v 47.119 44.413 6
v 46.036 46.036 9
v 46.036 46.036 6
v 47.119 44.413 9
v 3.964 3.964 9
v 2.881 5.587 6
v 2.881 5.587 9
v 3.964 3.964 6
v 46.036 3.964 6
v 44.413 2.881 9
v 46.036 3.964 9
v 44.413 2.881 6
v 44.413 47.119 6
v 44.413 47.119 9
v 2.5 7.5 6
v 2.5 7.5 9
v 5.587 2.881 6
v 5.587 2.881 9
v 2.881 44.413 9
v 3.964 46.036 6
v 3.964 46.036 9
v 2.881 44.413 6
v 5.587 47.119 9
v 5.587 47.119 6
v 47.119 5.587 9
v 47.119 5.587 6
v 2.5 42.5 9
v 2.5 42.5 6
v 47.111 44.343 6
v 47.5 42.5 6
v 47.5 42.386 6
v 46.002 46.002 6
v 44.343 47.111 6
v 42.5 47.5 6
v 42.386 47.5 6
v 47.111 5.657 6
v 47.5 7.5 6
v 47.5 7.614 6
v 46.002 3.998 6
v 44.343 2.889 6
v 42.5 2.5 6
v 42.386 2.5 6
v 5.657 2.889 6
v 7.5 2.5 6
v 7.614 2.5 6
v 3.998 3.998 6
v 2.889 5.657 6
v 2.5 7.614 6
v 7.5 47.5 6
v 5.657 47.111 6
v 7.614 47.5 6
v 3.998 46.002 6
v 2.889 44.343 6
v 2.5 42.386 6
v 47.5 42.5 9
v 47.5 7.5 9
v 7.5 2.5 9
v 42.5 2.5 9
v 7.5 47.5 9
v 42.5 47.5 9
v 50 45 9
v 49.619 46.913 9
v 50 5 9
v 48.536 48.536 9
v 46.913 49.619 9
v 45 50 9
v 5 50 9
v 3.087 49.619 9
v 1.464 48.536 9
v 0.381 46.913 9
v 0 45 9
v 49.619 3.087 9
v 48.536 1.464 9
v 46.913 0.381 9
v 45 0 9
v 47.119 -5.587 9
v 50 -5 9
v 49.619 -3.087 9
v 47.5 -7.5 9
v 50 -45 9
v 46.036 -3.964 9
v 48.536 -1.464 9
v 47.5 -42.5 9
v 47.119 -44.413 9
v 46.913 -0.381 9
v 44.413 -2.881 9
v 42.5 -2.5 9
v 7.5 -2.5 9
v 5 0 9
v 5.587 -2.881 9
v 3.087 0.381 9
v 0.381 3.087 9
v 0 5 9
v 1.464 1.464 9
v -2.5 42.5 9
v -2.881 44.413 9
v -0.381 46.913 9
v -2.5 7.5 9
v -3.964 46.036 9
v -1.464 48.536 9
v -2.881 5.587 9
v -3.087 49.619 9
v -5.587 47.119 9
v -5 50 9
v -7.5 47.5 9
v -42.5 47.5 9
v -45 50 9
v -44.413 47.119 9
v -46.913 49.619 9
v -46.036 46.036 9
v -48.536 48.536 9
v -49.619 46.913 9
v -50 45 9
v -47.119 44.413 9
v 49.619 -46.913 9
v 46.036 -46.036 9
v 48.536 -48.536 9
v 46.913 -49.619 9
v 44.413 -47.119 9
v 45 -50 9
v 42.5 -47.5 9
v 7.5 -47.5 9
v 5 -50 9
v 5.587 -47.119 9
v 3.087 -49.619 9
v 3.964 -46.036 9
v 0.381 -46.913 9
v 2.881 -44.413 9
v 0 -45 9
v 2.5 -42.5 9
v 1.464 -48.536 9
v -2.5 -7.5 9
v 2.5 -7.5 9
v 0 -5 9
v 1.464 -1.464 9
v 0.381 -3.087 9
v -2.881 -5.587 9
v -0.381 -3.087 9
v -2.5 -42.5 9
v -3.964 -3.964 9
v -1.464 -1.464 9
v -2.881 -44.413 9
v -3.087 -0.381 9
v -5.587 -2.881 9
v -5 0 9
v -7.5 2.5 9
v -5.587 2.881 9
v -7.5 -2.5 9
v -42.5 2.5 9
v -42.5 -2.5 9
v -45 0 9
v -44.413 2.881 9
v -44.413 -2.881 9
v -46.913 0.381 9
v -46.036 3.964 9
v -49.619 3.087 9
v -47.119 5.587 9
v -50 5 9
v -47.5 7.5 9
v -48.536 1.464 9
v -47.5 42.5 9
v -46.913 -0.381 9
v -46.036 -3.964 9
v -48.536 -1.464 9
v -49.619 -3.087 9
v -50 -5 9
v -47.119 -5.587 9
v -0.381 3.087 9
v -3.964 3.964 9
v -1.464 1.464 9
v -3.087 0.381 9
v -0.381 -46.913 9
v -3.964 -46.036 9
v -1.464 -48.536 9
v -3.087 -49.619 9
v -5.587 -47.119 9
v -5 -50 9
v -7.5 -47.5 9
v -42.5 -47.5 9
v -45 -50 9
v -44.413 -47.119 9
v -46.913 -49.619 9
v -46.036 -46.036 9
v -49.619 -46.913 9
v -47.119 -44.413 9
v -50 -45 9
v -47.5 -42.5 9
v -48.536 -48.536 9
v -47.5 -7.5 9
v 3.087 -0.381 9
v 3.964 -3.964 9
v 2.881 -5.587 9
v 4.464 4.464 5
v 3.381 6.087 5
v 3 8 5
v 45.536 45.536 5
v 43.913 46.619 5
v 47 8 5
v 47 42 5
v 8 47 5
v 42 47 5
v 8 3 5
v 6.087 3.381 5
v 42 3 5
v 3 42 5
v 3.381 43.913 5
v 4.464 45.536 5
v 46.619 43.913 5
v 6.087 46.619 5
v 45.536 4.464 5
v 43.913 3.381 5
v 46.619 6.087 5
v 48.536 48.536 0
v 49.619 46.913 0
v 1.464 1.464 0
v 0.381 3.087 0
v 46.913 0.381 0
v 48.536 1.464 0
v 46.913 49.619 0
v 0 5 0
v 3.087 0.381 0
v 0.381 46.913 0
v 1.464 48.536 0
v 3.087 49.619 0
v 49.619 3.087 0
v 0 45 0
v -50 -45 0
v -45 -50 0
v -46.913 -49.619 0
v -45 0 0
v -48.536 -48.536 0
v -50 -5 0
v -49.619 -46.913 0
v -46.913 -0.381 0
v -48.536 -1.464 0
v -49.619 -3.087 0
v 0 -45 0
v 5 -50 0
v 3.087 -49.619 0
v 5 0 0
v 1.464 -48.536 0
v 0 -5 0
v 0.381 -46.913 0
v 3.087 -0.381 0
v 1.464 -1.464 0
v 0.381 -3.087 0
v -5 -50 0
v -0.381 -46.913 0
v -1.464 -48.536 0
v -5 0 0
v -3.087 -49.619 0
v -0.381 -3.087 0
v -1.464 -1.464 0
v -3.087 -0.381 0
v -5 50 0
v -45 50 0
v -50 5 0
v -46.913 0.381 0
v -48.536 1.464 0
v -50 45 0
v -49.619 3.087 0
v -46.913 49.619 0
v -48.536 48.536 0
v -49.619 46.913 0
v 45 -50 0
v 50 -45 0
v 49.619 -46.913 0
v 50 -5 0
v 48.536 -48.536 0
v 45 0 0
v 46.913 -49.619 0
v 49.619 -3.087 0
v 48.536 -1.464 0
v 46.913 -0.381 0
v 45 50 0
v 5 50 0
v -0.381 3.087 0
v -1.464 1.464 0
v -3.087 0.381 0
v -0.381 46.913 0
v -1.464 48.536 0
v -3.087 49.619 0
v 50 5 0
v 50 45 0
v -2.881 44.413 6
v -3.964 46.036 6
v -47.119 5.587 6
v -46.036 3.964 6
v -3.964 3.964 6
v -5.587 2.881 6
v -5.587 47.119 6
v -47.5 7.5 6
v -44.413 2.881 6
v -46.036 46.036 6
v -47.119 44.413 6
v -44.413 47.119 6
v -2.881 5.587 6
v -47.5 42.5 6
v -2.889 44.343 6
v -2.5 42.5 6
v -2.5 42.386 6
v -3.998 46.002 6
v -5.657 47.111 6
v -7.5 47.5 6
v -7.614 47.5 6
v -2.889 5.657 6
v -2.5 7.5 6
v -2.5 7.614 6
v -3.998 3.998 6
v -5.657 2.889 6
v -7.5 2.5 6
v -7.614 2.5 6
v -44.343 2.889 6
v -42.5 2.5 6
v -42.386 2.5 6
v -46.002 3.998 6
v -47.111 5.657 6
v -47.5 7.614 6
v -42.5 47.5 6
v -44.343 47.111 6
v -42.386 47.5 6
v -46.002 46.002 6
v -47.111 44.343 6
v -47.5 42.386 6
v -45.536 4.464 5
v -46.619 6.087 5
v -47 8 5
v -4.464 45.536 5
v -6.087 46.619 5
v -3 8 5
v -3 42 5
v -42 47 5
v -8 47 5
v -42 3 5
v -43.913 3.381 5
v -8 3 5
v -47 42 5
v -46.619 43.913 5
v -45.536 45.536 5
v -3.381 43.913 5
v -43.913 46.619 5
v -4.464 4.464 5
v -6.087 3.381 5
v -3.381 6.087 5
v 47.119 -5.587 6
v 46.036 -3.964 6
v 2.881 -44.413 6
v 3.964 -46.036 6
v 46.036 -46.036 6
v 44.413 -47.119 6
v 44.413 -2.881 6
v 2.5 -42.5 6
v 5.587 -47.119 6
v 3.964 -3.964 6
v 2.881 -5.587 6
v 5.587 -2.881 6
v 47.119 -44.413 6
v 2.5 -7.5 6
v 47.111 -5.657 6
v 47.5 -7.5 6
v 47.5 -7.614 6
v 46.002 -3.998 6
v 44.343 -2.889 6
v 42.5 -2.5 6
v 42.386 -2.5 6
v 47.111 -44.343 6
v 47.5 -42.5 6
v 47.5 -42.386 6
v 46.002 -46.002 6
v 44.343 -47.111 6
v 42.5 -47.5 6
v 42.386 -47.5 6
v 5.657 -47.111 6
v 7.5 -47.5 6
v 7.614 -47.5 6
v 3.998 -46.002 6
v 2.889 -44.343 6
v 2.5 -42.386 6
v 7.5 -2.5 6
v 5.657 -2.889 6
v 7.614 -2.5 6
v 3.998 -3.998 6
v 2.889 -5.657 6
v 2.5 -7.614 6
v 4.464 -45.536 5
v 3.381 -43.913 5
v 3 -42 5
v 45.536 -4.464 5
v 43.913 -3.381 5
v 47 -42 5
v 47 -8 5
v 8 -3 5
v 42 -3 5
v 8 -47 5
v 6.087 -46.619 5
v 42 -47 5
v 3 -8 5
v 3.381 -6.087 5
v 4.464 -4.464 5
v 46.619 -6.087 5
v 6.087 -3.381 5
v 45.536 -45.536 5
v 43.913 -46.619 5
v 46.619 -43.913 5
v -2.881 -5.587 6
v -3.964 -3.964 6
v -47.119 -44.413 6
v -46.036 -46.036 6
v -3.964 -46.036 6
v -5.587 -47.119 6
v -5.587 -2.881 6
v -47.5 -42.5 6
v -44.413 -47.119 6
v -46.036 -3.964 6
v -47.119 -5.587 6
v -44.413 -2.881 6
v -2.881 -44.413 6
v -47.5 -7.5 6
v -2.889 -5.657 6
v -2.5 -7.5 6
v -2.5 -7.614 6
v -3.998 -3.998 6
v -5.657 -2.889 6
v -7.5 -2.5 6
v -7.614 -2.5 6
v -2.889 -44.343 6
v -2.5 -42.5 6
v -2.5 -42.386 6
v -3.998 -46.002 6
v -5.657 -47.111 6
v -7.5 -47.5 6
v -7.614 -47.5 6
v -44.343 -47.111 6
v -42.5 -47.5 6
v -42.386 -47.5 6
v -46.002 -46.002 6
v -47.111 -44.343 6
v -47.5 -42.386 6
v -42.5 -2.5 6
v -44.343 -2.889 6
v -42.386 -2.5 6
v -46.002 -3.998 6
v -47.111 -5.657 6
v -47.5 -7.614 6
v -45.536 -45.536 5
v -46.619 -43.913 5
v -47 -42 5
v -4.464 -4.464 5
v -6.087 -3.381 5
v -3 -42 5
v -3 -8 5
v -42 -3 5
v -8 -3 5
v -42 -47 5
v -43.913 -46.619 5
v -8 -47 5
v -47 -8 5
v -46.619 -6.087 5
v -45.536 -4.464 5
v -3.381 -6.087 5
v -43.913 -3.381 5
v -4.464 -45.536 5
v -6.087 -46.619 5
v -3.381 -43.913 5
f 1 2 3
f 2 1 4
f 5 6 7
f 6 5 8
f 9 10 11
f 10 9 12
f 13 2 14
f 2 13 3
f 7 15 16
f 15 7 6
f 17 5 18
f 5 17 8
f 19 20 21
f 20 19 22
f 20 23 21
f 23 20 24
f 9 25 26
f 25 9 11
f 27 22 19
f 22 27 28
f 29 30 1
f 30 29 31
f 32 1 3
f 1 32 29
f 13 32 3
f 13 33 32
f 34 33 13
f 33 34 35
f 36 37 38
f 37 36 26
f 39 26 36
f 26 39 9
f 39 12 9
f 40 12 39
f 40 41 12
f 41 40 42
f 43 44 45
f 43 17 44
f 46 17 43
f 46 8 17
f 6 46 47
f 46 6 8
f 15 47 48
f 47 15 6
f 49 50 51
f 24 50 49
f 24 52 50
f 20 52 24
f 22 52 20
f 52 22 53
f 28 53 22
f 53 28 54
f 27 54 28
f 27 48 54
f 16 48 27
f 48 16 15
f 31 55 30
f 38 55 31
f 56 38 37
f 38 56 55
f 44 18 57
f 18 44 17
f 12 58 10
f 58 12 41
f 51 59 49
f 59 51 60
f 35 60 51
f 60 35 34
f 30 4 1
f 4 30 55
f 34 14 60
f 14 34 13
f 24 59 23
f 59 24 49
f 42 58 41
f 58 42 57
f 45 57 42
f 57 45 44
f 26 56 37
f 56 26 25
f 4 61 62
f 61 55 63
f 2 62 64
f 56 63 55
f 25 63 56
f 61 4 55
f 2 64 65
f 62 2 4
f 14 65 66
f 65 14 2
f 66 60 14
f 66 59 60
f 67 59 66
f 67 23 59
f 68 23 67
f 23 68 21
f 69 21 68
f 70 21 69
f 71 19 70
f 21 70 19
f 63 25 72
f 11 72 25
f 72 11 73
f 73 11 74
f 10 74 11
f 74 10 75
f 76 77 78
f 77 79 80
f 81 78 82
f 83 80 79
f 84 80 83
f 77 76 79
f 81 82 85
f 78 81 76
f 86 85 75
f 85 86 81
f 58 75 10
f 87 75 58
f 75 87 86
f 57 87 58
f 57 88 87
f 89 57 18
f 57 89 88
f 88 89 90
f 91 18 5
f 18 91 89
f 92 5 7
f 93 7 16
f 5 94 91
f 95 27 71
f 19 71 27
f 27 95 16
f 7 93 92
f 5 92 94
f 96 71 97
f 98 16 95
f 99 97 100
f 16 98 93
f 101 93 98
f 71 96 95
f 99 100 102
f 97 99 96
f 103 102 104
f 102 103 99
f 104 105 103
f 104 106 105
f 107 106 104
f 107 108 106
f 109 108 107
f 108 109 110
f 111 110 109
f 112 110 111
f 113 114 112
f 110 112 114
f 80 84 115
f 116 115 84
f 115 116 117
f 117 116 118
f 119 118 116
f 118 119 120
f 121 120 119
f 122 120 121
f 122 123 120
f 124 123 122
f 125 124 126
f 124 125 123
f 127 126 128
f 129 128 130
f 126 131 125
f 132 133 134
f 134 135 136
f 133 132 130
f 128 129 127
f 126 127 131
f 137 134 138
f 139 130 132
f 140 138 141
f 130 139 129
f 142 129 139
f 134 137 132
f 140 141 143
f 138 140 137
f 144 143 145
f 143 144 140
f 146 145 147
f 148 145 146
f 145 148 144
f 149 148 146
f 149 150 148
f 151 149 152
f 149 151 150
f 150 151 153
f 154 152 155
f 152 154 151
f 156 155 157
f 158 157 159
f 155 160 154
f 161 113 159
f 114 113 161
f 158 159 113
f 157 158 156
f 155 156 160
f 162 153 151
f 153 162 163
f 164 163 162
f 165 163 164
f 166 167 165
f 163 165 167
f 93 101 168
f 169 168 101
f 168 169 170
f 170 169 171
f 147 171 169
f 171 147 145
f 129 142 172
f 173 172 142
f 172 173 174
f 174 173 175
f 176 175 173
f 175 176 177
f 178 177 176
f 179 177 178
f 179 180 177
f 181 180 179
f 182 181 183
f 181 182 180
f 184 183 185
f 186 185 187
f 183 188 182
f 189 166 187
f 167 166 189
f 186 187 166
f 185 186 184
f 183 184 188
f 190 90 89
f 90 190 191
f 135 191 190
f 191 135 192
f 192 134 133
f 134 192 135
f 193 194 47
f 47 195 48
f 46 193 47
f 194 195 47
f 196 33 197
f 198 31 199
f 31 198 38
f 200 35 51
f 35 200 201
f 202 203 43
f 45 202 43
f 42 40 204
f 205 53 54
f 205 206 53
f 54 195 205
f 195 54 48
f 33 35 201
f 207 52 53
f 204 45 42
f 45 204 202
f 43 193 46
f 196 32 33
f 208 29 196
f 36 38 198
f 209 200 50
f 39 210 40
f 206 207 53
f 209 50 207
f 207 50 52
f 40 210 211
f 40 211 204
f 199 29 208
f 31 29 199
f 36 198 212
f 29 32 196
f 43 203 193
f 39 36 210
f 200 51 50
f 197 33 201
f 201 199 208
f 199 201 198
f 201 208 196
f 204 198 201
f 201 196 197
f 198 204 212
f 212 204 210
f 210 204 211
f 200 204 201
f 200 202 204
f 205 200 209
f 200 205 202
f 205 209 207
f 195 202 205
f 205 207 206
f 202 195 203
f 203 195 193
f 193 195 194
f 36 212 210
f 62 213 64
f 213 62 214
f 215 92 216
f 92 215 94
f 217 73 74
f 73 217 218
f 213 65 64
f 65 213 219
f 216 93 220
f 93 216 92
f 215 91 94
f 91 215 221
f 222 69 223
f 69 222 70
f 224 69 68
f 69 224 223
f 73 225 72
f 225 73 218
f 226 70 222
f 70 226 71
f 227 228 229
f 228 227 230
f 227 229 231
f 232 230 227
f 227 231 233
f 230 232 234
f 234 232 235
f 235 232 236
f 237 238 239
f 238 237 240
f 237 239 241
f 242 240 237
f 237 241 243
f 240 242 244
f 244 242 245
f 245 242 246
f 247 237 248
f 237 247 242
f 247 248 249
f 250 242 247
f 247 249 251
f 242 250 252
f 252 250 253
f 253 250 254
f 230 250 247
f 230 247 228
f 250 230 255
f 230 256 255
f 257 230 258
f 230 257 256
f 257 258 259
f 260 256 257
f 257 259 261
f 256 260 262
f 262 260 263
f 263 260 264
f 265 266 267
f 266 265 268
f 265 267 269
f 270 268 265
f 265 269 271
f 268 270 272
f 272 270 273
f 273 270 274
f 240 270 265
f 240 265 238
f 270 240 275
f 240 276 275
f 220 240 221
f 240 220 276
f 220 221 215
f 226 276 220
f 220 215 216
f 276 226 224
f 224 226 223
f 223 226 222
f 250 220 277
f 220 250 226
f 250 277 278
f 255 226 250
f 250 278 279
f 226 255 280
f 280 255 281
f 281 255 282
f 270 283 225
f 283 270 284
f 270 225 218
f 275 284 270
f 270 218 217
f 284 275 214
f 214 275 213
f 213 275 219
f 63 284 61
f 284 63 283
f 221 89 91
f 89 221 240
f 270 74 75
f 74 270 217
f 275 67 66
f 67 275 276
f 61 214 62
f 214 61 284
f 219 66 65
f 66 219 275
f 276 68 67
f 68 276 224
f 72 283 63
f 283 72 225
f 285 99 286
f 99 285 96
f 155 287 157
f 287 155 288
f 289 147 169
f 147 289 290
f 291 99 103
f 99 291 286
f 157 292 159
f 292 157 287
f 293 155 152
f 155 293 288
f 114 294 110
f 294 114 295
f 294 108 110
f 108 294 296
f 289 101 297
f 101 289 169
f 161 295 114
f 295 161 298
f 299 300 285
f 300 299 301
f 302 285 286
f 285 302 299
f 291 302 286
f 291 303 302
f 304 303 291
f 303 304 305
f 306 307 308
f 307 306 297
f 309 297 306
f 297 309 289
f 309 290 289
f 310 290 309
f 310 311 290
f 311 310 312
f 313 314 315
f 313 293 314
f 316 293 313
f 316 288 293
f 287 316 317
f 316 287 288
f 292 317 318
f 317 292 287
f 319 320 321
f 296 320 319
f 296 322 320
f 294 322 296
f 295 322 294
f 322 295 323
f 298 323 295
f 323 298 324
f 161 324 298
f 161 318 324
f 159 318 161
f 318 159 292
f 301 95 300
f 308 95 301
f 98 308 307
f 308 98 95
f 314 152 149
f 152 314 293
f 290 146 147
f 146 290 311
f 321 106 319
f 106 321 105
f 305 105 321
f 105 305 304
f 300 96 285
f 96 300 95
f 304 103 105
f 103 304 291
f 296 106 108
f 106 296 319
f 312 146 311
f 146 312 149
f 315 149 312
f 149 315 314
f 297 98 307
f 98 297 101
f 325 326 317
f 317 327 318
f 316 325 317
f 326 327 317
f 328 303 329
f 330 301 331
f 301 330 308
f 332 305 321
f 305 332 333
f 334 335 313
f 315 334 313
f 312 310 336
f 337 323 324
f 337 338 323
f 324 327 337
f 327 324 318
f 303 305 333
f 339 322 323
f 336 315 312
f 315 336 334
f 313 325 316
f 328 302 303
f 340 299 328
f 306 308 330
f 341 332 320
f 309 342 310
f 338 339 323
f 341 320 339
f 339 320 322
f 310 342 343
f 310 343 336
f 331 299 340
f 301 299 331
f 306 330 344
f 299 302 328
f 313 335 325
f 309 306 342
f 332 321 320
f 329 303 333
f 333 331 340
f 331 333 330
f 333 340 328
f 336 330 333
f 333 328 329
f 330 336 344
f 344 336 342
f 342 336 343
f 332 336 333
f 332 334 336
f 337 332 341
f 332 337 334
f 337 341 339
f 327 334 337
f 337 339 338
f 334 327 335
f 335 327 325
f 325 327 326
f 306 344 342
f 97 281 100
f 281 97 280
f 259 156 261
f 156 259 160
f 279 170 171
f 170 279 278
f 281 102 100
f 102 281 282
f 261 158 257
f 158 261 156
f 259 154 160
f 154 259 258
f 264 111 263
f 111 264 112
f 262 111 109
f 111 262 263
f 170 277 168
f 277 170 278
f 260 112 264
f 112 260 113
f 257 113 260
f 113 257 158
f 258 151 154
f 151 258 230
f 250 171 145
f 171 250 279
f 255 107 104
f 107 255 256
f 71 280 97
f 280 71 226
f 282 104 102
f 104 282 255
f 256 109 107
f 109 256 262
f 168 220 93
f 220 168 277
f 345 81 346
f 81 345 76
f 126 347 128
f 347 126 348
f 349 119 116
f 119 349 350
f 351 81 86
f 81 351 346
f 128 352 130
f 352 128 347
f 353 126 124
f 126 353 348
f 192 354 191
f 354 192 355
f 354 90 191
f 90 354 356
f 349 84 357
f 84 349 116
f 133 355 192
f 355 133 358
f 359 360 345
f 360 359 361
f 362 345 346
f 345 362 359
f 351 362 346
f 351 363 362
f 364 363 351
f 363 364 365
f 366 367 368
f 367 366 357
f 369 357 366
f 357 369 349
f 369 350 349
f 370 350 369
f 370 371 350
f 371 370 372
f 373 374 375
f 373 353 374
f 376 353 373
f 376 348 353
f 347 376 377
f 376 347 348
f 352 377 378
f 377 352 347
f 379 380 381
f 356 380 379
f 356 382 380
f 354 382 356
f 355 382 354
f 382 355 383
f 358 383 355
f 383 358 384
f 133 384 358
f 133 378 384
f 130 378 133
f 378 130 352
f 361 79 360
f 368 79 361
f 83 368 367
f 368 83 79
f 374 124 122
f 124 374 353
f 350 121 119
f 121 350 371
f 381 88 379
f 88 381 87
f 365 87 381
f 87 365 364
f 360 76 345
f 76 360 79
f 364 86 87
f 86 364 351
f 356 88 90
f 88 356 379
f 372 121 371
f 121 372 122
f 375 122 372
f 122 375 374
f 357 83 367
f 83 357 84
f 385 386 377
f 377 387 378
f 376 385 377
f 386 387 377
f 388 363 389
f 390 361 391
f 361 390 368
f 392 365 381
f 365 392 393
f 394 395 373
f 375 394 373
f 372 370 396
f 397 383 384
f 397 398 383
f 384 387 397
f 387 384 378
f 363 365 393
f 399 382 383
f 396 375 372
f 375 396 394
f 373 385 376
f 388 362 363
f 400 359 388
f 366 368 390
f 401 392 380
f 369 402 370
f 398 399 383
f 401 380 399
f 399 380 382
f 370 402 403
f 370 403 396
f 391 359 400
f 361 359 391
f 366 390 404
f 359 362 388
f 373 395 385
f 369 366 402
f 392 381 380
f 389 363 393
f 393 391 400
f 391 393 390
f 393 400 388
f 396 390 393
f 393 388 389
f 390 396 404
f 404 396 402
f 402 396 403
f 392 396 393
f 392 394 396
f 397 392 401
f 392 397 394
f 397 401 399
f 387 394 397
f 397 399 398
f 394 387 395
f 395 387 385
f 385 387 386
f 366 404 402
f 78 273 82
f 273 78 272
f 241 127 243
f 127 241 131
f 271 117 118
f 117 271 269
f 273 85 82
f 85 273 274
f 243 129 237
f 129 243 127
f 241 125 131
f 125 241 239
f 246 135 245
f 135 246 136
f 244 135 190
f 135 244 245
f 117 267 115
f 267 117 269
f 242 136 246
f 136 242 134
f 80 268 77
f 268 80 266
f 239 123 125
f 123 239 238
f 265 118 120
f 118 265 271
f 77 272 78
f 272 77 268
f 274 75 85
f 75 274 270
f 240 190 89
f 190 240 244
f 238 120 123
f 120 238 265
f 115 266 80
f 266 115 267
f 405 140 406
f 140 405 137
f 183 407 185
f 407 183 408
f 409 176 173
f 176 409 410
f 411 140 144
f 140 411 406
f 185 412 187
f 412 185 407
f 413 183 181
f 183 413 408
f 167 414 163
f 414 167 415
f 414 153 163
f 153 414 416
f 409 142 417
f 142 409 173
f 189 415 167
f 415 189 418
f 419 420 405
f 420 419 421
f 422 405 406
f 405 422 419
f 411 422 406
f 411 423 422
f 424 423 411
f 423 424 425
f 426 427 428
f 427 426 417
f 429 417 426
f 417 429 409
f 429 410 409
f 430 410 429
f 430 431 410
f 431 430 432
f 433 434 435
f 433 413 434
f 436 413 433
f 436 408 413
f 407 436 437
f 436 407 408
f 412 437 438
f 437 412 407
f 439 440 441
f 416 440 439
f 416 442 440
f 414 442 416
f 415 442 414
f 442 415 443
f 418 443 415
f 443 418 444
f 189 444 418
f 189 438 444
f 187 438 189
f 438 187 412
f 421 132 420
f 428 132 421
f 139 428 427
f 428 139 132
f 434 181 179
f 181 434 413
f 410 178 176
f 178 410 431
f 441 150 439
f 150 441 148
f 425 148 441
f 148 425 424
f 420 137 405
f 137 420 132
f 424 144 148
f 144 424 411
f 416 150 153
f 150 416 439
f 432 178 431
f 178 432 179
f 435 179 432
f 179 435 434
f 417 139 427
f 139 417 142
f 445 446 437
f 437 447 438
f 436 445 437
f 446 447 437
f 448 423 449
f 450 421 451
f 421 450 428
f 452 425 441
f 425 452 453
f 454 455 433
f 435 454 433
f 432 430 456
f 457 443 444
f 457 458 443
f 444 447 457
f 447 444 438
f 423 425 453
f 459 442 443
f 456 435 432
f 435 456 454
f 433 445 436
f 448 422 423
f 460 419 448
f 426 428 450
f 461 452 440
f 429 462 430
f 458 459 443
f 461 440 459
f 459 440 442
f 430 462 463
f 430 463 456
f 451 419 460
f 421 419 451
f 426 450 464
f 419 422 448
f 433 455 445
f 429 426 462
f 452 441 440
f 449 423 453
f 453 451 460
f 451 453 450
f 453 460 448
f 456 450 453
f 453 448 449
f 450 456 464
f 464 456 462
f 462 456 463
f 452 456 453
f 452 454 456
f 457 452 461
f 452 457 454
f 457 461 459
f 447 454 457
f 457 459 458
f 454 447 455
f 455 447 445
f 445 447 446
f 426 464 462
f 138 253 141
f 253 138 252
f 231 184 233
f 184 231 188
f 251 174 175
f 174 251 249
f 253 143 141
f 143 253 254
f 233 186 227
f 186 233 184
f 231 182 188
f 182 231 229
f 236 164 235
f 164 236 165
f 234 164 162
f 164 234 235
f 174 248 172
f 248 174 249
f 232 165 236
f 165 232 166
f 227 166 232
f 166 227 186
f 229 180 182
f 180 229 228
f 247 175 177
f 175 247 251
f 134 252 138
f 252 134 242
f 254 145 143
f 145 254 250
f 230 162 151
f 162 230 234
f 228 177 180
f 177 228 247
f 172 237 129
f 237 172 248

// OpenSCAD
// file: modules.scad
// In the base: The largest rounded cuboid (in terms of length and width) with
// sides perpendicular to the ground (not-slanted) is called the body. The
// second largest of the same description is the leg. The bottom 2d surface is
// the foot. The trapezoid connecting body to leg is the hip, and the trapezoid
// from hip to foot is the ankle.

module slot(
        mm_length=1*50, mm_width=1*50, mm_radius=5,
        mm_length_body_diff_leg=5, mm_length_leg_diff_foot=1,
        mm_width_body_diff_leg=5, mm_width_leg_diff_foot=1,
        mm_height_leg=3, mm_height_ankle=1, mm_base_thickness=5) {
    difference() {
        linear_extrude(height=mm_height_leg+mm_height_ankle+mm_base_thickness)
        roundedsquare(
            size=[mm_length, mm_width],
            center=true, r=mm_radius);
        translate([0, 0, mm_base_thickness])
        base(
            mm_length=mm_length, mm_width=mm_width,
            mm_height=0, mm_radius=mm_radius,
            mm_length_body_diff_leg=mm_length_body_diff_leg,
            mm_length_leg_diff_foot=mm_length_leg_diff_foot,
            mm_width_body_diff_leg=mm_width_body_diff_leg,
            mm_width_leg_diff_foot=mm_width_leg_diff_foot,
            mm_height_hip=0,
            mm_height_leg=mm_height_leg, mm_height_ankle=mm_height_ankle);
    }
}

module base_hollowed(
        mm_thickness=5,
        mm_length=1*50, mm_width=1*50, mm_height=10, mm_radius=5,
        mm_length_body_diff_leg=5, mm_length_leg_diff_foot=1,
        mm_width_body_diff_leg=5, mm_width_leg_diff_foot=1,
        mm_height_hip=3, mm_height_leg=3, mm_height_ankle=1) {
    difference() {
        base(
            mm_length, mm_width, mm_height, mm_radius,
            mm_length_body_diff_leg, mm_length_leg_diff_foot,
            mm_width_body_diff_leg, mm_width_leg_diff_foot,
            mm_height_hip, mm_height_leg, mm_height_ankle);
        translate([0, 0, mm_thickness])
            base(
                mm_length, mm_width, mm_height, mm_radius,
                mm_length_body_diff_leg, mm_length_leg_diff_foot,
                mm_width_body_diff_leg, mm_width_leg_diff_foot,
                mm_height_hip, mm_height_leg, mm_height_ankle);
    }
}

module base(
        mm_length=1*50, mm_width=1*50, mm_height=10, mm_radius=5,
        mm_length_body_diff_leg=5, mm_length_leg_diff_foot=1,
        mm_width_body_diff_leg=5, mm_width_leg_diff_foot=1,
        mm_height_hip=3, mm_height_leg=3, mm_height_ankle=1) {
    union() {
        // Draws the body
        translate([0, 0, mm_height_ankle+mm_height_leg+mm_height_hip])
        linear_extrude(height=mm_height-mm_height_hip-mm_height_leg-mm_height_ankle)
        roundedsquare(size=[mm_length, mm_width], center=true, r=mm_radius);

        // Draws the hip
        translate([0, 0, mm_height_ankle+mm_height_leg])
        linear_extrude(
            height=mm_height_hip, scale=[
                mm_length / (mm_length - mm_length_body_diff_leg),
                mm_width  / (mm_width  - mm_width_body_diff_leg)])
        roundedsquare(
            size=[mm_length - mm_length_body_diff_leg,
                mm_width  - mm_width_body_diff_leg],
            center=true, r=mm_radius);

        // Draws the leg
        translate([0, 0, mm_height_ankle])
        linear_extrude(height=mm_height_leg)
        roundedsquare(
            size=[mm_length - mm_length_body_diff_leg,
                  mm_width  - mm_width_body_diff_leg],
            center=true, r=mm_radius);

        // Draws the ankle
        linear_extrude(
            height=mm_height_ankle, scale=[
                (mm_length-mm_length_body_diff_leg)/
                    (mm_length-mm_length_body_diff_leg-mm_length_leg_diff_foot),
                (mm_length-mm_length_body_diff_leg)/
                    (mm_length-mm_length_body_diff_leg-mm_length_leg_diff_foot)])
        roundedsquare(
            size=[mm_length - mm_length_body_diff_leg - mm_length_leg_diff_foot,
                  mm_width  - mm_width_body_diff_leg  - mm_width_leg_diff_foot],
            center=true, r=mm_radius);
    }
}

module roundedsquare(size=1, center=false, r=0.5) {
    size = (size[0] == undef) ? [size, size] : size;
    move_by = center ? [-(size[0])/2, -(size[1])/2] : [0, 0];
    translate(move_by) {
        hull() {
            // Top-left corner
            translate([r, r]) circle(r=r);
            // Top-right corner
            translate([size[0]-r, r]) circle(r=r);
            // Bottom-right corner
            translate([size[0]-r, size[1]-r]) circle(r=r);
            // Bottom-left corner
            translate([r, size[1]-r]) circle(r=r);
        }
    }
}
// main file
use <modules.scad>

union() {
    translate([ 25,  25]) slot();
    translate([-25,  25]) slot();
    translate([ 25, -25]) slot();
    translate([-25, -25]) slot();
}
